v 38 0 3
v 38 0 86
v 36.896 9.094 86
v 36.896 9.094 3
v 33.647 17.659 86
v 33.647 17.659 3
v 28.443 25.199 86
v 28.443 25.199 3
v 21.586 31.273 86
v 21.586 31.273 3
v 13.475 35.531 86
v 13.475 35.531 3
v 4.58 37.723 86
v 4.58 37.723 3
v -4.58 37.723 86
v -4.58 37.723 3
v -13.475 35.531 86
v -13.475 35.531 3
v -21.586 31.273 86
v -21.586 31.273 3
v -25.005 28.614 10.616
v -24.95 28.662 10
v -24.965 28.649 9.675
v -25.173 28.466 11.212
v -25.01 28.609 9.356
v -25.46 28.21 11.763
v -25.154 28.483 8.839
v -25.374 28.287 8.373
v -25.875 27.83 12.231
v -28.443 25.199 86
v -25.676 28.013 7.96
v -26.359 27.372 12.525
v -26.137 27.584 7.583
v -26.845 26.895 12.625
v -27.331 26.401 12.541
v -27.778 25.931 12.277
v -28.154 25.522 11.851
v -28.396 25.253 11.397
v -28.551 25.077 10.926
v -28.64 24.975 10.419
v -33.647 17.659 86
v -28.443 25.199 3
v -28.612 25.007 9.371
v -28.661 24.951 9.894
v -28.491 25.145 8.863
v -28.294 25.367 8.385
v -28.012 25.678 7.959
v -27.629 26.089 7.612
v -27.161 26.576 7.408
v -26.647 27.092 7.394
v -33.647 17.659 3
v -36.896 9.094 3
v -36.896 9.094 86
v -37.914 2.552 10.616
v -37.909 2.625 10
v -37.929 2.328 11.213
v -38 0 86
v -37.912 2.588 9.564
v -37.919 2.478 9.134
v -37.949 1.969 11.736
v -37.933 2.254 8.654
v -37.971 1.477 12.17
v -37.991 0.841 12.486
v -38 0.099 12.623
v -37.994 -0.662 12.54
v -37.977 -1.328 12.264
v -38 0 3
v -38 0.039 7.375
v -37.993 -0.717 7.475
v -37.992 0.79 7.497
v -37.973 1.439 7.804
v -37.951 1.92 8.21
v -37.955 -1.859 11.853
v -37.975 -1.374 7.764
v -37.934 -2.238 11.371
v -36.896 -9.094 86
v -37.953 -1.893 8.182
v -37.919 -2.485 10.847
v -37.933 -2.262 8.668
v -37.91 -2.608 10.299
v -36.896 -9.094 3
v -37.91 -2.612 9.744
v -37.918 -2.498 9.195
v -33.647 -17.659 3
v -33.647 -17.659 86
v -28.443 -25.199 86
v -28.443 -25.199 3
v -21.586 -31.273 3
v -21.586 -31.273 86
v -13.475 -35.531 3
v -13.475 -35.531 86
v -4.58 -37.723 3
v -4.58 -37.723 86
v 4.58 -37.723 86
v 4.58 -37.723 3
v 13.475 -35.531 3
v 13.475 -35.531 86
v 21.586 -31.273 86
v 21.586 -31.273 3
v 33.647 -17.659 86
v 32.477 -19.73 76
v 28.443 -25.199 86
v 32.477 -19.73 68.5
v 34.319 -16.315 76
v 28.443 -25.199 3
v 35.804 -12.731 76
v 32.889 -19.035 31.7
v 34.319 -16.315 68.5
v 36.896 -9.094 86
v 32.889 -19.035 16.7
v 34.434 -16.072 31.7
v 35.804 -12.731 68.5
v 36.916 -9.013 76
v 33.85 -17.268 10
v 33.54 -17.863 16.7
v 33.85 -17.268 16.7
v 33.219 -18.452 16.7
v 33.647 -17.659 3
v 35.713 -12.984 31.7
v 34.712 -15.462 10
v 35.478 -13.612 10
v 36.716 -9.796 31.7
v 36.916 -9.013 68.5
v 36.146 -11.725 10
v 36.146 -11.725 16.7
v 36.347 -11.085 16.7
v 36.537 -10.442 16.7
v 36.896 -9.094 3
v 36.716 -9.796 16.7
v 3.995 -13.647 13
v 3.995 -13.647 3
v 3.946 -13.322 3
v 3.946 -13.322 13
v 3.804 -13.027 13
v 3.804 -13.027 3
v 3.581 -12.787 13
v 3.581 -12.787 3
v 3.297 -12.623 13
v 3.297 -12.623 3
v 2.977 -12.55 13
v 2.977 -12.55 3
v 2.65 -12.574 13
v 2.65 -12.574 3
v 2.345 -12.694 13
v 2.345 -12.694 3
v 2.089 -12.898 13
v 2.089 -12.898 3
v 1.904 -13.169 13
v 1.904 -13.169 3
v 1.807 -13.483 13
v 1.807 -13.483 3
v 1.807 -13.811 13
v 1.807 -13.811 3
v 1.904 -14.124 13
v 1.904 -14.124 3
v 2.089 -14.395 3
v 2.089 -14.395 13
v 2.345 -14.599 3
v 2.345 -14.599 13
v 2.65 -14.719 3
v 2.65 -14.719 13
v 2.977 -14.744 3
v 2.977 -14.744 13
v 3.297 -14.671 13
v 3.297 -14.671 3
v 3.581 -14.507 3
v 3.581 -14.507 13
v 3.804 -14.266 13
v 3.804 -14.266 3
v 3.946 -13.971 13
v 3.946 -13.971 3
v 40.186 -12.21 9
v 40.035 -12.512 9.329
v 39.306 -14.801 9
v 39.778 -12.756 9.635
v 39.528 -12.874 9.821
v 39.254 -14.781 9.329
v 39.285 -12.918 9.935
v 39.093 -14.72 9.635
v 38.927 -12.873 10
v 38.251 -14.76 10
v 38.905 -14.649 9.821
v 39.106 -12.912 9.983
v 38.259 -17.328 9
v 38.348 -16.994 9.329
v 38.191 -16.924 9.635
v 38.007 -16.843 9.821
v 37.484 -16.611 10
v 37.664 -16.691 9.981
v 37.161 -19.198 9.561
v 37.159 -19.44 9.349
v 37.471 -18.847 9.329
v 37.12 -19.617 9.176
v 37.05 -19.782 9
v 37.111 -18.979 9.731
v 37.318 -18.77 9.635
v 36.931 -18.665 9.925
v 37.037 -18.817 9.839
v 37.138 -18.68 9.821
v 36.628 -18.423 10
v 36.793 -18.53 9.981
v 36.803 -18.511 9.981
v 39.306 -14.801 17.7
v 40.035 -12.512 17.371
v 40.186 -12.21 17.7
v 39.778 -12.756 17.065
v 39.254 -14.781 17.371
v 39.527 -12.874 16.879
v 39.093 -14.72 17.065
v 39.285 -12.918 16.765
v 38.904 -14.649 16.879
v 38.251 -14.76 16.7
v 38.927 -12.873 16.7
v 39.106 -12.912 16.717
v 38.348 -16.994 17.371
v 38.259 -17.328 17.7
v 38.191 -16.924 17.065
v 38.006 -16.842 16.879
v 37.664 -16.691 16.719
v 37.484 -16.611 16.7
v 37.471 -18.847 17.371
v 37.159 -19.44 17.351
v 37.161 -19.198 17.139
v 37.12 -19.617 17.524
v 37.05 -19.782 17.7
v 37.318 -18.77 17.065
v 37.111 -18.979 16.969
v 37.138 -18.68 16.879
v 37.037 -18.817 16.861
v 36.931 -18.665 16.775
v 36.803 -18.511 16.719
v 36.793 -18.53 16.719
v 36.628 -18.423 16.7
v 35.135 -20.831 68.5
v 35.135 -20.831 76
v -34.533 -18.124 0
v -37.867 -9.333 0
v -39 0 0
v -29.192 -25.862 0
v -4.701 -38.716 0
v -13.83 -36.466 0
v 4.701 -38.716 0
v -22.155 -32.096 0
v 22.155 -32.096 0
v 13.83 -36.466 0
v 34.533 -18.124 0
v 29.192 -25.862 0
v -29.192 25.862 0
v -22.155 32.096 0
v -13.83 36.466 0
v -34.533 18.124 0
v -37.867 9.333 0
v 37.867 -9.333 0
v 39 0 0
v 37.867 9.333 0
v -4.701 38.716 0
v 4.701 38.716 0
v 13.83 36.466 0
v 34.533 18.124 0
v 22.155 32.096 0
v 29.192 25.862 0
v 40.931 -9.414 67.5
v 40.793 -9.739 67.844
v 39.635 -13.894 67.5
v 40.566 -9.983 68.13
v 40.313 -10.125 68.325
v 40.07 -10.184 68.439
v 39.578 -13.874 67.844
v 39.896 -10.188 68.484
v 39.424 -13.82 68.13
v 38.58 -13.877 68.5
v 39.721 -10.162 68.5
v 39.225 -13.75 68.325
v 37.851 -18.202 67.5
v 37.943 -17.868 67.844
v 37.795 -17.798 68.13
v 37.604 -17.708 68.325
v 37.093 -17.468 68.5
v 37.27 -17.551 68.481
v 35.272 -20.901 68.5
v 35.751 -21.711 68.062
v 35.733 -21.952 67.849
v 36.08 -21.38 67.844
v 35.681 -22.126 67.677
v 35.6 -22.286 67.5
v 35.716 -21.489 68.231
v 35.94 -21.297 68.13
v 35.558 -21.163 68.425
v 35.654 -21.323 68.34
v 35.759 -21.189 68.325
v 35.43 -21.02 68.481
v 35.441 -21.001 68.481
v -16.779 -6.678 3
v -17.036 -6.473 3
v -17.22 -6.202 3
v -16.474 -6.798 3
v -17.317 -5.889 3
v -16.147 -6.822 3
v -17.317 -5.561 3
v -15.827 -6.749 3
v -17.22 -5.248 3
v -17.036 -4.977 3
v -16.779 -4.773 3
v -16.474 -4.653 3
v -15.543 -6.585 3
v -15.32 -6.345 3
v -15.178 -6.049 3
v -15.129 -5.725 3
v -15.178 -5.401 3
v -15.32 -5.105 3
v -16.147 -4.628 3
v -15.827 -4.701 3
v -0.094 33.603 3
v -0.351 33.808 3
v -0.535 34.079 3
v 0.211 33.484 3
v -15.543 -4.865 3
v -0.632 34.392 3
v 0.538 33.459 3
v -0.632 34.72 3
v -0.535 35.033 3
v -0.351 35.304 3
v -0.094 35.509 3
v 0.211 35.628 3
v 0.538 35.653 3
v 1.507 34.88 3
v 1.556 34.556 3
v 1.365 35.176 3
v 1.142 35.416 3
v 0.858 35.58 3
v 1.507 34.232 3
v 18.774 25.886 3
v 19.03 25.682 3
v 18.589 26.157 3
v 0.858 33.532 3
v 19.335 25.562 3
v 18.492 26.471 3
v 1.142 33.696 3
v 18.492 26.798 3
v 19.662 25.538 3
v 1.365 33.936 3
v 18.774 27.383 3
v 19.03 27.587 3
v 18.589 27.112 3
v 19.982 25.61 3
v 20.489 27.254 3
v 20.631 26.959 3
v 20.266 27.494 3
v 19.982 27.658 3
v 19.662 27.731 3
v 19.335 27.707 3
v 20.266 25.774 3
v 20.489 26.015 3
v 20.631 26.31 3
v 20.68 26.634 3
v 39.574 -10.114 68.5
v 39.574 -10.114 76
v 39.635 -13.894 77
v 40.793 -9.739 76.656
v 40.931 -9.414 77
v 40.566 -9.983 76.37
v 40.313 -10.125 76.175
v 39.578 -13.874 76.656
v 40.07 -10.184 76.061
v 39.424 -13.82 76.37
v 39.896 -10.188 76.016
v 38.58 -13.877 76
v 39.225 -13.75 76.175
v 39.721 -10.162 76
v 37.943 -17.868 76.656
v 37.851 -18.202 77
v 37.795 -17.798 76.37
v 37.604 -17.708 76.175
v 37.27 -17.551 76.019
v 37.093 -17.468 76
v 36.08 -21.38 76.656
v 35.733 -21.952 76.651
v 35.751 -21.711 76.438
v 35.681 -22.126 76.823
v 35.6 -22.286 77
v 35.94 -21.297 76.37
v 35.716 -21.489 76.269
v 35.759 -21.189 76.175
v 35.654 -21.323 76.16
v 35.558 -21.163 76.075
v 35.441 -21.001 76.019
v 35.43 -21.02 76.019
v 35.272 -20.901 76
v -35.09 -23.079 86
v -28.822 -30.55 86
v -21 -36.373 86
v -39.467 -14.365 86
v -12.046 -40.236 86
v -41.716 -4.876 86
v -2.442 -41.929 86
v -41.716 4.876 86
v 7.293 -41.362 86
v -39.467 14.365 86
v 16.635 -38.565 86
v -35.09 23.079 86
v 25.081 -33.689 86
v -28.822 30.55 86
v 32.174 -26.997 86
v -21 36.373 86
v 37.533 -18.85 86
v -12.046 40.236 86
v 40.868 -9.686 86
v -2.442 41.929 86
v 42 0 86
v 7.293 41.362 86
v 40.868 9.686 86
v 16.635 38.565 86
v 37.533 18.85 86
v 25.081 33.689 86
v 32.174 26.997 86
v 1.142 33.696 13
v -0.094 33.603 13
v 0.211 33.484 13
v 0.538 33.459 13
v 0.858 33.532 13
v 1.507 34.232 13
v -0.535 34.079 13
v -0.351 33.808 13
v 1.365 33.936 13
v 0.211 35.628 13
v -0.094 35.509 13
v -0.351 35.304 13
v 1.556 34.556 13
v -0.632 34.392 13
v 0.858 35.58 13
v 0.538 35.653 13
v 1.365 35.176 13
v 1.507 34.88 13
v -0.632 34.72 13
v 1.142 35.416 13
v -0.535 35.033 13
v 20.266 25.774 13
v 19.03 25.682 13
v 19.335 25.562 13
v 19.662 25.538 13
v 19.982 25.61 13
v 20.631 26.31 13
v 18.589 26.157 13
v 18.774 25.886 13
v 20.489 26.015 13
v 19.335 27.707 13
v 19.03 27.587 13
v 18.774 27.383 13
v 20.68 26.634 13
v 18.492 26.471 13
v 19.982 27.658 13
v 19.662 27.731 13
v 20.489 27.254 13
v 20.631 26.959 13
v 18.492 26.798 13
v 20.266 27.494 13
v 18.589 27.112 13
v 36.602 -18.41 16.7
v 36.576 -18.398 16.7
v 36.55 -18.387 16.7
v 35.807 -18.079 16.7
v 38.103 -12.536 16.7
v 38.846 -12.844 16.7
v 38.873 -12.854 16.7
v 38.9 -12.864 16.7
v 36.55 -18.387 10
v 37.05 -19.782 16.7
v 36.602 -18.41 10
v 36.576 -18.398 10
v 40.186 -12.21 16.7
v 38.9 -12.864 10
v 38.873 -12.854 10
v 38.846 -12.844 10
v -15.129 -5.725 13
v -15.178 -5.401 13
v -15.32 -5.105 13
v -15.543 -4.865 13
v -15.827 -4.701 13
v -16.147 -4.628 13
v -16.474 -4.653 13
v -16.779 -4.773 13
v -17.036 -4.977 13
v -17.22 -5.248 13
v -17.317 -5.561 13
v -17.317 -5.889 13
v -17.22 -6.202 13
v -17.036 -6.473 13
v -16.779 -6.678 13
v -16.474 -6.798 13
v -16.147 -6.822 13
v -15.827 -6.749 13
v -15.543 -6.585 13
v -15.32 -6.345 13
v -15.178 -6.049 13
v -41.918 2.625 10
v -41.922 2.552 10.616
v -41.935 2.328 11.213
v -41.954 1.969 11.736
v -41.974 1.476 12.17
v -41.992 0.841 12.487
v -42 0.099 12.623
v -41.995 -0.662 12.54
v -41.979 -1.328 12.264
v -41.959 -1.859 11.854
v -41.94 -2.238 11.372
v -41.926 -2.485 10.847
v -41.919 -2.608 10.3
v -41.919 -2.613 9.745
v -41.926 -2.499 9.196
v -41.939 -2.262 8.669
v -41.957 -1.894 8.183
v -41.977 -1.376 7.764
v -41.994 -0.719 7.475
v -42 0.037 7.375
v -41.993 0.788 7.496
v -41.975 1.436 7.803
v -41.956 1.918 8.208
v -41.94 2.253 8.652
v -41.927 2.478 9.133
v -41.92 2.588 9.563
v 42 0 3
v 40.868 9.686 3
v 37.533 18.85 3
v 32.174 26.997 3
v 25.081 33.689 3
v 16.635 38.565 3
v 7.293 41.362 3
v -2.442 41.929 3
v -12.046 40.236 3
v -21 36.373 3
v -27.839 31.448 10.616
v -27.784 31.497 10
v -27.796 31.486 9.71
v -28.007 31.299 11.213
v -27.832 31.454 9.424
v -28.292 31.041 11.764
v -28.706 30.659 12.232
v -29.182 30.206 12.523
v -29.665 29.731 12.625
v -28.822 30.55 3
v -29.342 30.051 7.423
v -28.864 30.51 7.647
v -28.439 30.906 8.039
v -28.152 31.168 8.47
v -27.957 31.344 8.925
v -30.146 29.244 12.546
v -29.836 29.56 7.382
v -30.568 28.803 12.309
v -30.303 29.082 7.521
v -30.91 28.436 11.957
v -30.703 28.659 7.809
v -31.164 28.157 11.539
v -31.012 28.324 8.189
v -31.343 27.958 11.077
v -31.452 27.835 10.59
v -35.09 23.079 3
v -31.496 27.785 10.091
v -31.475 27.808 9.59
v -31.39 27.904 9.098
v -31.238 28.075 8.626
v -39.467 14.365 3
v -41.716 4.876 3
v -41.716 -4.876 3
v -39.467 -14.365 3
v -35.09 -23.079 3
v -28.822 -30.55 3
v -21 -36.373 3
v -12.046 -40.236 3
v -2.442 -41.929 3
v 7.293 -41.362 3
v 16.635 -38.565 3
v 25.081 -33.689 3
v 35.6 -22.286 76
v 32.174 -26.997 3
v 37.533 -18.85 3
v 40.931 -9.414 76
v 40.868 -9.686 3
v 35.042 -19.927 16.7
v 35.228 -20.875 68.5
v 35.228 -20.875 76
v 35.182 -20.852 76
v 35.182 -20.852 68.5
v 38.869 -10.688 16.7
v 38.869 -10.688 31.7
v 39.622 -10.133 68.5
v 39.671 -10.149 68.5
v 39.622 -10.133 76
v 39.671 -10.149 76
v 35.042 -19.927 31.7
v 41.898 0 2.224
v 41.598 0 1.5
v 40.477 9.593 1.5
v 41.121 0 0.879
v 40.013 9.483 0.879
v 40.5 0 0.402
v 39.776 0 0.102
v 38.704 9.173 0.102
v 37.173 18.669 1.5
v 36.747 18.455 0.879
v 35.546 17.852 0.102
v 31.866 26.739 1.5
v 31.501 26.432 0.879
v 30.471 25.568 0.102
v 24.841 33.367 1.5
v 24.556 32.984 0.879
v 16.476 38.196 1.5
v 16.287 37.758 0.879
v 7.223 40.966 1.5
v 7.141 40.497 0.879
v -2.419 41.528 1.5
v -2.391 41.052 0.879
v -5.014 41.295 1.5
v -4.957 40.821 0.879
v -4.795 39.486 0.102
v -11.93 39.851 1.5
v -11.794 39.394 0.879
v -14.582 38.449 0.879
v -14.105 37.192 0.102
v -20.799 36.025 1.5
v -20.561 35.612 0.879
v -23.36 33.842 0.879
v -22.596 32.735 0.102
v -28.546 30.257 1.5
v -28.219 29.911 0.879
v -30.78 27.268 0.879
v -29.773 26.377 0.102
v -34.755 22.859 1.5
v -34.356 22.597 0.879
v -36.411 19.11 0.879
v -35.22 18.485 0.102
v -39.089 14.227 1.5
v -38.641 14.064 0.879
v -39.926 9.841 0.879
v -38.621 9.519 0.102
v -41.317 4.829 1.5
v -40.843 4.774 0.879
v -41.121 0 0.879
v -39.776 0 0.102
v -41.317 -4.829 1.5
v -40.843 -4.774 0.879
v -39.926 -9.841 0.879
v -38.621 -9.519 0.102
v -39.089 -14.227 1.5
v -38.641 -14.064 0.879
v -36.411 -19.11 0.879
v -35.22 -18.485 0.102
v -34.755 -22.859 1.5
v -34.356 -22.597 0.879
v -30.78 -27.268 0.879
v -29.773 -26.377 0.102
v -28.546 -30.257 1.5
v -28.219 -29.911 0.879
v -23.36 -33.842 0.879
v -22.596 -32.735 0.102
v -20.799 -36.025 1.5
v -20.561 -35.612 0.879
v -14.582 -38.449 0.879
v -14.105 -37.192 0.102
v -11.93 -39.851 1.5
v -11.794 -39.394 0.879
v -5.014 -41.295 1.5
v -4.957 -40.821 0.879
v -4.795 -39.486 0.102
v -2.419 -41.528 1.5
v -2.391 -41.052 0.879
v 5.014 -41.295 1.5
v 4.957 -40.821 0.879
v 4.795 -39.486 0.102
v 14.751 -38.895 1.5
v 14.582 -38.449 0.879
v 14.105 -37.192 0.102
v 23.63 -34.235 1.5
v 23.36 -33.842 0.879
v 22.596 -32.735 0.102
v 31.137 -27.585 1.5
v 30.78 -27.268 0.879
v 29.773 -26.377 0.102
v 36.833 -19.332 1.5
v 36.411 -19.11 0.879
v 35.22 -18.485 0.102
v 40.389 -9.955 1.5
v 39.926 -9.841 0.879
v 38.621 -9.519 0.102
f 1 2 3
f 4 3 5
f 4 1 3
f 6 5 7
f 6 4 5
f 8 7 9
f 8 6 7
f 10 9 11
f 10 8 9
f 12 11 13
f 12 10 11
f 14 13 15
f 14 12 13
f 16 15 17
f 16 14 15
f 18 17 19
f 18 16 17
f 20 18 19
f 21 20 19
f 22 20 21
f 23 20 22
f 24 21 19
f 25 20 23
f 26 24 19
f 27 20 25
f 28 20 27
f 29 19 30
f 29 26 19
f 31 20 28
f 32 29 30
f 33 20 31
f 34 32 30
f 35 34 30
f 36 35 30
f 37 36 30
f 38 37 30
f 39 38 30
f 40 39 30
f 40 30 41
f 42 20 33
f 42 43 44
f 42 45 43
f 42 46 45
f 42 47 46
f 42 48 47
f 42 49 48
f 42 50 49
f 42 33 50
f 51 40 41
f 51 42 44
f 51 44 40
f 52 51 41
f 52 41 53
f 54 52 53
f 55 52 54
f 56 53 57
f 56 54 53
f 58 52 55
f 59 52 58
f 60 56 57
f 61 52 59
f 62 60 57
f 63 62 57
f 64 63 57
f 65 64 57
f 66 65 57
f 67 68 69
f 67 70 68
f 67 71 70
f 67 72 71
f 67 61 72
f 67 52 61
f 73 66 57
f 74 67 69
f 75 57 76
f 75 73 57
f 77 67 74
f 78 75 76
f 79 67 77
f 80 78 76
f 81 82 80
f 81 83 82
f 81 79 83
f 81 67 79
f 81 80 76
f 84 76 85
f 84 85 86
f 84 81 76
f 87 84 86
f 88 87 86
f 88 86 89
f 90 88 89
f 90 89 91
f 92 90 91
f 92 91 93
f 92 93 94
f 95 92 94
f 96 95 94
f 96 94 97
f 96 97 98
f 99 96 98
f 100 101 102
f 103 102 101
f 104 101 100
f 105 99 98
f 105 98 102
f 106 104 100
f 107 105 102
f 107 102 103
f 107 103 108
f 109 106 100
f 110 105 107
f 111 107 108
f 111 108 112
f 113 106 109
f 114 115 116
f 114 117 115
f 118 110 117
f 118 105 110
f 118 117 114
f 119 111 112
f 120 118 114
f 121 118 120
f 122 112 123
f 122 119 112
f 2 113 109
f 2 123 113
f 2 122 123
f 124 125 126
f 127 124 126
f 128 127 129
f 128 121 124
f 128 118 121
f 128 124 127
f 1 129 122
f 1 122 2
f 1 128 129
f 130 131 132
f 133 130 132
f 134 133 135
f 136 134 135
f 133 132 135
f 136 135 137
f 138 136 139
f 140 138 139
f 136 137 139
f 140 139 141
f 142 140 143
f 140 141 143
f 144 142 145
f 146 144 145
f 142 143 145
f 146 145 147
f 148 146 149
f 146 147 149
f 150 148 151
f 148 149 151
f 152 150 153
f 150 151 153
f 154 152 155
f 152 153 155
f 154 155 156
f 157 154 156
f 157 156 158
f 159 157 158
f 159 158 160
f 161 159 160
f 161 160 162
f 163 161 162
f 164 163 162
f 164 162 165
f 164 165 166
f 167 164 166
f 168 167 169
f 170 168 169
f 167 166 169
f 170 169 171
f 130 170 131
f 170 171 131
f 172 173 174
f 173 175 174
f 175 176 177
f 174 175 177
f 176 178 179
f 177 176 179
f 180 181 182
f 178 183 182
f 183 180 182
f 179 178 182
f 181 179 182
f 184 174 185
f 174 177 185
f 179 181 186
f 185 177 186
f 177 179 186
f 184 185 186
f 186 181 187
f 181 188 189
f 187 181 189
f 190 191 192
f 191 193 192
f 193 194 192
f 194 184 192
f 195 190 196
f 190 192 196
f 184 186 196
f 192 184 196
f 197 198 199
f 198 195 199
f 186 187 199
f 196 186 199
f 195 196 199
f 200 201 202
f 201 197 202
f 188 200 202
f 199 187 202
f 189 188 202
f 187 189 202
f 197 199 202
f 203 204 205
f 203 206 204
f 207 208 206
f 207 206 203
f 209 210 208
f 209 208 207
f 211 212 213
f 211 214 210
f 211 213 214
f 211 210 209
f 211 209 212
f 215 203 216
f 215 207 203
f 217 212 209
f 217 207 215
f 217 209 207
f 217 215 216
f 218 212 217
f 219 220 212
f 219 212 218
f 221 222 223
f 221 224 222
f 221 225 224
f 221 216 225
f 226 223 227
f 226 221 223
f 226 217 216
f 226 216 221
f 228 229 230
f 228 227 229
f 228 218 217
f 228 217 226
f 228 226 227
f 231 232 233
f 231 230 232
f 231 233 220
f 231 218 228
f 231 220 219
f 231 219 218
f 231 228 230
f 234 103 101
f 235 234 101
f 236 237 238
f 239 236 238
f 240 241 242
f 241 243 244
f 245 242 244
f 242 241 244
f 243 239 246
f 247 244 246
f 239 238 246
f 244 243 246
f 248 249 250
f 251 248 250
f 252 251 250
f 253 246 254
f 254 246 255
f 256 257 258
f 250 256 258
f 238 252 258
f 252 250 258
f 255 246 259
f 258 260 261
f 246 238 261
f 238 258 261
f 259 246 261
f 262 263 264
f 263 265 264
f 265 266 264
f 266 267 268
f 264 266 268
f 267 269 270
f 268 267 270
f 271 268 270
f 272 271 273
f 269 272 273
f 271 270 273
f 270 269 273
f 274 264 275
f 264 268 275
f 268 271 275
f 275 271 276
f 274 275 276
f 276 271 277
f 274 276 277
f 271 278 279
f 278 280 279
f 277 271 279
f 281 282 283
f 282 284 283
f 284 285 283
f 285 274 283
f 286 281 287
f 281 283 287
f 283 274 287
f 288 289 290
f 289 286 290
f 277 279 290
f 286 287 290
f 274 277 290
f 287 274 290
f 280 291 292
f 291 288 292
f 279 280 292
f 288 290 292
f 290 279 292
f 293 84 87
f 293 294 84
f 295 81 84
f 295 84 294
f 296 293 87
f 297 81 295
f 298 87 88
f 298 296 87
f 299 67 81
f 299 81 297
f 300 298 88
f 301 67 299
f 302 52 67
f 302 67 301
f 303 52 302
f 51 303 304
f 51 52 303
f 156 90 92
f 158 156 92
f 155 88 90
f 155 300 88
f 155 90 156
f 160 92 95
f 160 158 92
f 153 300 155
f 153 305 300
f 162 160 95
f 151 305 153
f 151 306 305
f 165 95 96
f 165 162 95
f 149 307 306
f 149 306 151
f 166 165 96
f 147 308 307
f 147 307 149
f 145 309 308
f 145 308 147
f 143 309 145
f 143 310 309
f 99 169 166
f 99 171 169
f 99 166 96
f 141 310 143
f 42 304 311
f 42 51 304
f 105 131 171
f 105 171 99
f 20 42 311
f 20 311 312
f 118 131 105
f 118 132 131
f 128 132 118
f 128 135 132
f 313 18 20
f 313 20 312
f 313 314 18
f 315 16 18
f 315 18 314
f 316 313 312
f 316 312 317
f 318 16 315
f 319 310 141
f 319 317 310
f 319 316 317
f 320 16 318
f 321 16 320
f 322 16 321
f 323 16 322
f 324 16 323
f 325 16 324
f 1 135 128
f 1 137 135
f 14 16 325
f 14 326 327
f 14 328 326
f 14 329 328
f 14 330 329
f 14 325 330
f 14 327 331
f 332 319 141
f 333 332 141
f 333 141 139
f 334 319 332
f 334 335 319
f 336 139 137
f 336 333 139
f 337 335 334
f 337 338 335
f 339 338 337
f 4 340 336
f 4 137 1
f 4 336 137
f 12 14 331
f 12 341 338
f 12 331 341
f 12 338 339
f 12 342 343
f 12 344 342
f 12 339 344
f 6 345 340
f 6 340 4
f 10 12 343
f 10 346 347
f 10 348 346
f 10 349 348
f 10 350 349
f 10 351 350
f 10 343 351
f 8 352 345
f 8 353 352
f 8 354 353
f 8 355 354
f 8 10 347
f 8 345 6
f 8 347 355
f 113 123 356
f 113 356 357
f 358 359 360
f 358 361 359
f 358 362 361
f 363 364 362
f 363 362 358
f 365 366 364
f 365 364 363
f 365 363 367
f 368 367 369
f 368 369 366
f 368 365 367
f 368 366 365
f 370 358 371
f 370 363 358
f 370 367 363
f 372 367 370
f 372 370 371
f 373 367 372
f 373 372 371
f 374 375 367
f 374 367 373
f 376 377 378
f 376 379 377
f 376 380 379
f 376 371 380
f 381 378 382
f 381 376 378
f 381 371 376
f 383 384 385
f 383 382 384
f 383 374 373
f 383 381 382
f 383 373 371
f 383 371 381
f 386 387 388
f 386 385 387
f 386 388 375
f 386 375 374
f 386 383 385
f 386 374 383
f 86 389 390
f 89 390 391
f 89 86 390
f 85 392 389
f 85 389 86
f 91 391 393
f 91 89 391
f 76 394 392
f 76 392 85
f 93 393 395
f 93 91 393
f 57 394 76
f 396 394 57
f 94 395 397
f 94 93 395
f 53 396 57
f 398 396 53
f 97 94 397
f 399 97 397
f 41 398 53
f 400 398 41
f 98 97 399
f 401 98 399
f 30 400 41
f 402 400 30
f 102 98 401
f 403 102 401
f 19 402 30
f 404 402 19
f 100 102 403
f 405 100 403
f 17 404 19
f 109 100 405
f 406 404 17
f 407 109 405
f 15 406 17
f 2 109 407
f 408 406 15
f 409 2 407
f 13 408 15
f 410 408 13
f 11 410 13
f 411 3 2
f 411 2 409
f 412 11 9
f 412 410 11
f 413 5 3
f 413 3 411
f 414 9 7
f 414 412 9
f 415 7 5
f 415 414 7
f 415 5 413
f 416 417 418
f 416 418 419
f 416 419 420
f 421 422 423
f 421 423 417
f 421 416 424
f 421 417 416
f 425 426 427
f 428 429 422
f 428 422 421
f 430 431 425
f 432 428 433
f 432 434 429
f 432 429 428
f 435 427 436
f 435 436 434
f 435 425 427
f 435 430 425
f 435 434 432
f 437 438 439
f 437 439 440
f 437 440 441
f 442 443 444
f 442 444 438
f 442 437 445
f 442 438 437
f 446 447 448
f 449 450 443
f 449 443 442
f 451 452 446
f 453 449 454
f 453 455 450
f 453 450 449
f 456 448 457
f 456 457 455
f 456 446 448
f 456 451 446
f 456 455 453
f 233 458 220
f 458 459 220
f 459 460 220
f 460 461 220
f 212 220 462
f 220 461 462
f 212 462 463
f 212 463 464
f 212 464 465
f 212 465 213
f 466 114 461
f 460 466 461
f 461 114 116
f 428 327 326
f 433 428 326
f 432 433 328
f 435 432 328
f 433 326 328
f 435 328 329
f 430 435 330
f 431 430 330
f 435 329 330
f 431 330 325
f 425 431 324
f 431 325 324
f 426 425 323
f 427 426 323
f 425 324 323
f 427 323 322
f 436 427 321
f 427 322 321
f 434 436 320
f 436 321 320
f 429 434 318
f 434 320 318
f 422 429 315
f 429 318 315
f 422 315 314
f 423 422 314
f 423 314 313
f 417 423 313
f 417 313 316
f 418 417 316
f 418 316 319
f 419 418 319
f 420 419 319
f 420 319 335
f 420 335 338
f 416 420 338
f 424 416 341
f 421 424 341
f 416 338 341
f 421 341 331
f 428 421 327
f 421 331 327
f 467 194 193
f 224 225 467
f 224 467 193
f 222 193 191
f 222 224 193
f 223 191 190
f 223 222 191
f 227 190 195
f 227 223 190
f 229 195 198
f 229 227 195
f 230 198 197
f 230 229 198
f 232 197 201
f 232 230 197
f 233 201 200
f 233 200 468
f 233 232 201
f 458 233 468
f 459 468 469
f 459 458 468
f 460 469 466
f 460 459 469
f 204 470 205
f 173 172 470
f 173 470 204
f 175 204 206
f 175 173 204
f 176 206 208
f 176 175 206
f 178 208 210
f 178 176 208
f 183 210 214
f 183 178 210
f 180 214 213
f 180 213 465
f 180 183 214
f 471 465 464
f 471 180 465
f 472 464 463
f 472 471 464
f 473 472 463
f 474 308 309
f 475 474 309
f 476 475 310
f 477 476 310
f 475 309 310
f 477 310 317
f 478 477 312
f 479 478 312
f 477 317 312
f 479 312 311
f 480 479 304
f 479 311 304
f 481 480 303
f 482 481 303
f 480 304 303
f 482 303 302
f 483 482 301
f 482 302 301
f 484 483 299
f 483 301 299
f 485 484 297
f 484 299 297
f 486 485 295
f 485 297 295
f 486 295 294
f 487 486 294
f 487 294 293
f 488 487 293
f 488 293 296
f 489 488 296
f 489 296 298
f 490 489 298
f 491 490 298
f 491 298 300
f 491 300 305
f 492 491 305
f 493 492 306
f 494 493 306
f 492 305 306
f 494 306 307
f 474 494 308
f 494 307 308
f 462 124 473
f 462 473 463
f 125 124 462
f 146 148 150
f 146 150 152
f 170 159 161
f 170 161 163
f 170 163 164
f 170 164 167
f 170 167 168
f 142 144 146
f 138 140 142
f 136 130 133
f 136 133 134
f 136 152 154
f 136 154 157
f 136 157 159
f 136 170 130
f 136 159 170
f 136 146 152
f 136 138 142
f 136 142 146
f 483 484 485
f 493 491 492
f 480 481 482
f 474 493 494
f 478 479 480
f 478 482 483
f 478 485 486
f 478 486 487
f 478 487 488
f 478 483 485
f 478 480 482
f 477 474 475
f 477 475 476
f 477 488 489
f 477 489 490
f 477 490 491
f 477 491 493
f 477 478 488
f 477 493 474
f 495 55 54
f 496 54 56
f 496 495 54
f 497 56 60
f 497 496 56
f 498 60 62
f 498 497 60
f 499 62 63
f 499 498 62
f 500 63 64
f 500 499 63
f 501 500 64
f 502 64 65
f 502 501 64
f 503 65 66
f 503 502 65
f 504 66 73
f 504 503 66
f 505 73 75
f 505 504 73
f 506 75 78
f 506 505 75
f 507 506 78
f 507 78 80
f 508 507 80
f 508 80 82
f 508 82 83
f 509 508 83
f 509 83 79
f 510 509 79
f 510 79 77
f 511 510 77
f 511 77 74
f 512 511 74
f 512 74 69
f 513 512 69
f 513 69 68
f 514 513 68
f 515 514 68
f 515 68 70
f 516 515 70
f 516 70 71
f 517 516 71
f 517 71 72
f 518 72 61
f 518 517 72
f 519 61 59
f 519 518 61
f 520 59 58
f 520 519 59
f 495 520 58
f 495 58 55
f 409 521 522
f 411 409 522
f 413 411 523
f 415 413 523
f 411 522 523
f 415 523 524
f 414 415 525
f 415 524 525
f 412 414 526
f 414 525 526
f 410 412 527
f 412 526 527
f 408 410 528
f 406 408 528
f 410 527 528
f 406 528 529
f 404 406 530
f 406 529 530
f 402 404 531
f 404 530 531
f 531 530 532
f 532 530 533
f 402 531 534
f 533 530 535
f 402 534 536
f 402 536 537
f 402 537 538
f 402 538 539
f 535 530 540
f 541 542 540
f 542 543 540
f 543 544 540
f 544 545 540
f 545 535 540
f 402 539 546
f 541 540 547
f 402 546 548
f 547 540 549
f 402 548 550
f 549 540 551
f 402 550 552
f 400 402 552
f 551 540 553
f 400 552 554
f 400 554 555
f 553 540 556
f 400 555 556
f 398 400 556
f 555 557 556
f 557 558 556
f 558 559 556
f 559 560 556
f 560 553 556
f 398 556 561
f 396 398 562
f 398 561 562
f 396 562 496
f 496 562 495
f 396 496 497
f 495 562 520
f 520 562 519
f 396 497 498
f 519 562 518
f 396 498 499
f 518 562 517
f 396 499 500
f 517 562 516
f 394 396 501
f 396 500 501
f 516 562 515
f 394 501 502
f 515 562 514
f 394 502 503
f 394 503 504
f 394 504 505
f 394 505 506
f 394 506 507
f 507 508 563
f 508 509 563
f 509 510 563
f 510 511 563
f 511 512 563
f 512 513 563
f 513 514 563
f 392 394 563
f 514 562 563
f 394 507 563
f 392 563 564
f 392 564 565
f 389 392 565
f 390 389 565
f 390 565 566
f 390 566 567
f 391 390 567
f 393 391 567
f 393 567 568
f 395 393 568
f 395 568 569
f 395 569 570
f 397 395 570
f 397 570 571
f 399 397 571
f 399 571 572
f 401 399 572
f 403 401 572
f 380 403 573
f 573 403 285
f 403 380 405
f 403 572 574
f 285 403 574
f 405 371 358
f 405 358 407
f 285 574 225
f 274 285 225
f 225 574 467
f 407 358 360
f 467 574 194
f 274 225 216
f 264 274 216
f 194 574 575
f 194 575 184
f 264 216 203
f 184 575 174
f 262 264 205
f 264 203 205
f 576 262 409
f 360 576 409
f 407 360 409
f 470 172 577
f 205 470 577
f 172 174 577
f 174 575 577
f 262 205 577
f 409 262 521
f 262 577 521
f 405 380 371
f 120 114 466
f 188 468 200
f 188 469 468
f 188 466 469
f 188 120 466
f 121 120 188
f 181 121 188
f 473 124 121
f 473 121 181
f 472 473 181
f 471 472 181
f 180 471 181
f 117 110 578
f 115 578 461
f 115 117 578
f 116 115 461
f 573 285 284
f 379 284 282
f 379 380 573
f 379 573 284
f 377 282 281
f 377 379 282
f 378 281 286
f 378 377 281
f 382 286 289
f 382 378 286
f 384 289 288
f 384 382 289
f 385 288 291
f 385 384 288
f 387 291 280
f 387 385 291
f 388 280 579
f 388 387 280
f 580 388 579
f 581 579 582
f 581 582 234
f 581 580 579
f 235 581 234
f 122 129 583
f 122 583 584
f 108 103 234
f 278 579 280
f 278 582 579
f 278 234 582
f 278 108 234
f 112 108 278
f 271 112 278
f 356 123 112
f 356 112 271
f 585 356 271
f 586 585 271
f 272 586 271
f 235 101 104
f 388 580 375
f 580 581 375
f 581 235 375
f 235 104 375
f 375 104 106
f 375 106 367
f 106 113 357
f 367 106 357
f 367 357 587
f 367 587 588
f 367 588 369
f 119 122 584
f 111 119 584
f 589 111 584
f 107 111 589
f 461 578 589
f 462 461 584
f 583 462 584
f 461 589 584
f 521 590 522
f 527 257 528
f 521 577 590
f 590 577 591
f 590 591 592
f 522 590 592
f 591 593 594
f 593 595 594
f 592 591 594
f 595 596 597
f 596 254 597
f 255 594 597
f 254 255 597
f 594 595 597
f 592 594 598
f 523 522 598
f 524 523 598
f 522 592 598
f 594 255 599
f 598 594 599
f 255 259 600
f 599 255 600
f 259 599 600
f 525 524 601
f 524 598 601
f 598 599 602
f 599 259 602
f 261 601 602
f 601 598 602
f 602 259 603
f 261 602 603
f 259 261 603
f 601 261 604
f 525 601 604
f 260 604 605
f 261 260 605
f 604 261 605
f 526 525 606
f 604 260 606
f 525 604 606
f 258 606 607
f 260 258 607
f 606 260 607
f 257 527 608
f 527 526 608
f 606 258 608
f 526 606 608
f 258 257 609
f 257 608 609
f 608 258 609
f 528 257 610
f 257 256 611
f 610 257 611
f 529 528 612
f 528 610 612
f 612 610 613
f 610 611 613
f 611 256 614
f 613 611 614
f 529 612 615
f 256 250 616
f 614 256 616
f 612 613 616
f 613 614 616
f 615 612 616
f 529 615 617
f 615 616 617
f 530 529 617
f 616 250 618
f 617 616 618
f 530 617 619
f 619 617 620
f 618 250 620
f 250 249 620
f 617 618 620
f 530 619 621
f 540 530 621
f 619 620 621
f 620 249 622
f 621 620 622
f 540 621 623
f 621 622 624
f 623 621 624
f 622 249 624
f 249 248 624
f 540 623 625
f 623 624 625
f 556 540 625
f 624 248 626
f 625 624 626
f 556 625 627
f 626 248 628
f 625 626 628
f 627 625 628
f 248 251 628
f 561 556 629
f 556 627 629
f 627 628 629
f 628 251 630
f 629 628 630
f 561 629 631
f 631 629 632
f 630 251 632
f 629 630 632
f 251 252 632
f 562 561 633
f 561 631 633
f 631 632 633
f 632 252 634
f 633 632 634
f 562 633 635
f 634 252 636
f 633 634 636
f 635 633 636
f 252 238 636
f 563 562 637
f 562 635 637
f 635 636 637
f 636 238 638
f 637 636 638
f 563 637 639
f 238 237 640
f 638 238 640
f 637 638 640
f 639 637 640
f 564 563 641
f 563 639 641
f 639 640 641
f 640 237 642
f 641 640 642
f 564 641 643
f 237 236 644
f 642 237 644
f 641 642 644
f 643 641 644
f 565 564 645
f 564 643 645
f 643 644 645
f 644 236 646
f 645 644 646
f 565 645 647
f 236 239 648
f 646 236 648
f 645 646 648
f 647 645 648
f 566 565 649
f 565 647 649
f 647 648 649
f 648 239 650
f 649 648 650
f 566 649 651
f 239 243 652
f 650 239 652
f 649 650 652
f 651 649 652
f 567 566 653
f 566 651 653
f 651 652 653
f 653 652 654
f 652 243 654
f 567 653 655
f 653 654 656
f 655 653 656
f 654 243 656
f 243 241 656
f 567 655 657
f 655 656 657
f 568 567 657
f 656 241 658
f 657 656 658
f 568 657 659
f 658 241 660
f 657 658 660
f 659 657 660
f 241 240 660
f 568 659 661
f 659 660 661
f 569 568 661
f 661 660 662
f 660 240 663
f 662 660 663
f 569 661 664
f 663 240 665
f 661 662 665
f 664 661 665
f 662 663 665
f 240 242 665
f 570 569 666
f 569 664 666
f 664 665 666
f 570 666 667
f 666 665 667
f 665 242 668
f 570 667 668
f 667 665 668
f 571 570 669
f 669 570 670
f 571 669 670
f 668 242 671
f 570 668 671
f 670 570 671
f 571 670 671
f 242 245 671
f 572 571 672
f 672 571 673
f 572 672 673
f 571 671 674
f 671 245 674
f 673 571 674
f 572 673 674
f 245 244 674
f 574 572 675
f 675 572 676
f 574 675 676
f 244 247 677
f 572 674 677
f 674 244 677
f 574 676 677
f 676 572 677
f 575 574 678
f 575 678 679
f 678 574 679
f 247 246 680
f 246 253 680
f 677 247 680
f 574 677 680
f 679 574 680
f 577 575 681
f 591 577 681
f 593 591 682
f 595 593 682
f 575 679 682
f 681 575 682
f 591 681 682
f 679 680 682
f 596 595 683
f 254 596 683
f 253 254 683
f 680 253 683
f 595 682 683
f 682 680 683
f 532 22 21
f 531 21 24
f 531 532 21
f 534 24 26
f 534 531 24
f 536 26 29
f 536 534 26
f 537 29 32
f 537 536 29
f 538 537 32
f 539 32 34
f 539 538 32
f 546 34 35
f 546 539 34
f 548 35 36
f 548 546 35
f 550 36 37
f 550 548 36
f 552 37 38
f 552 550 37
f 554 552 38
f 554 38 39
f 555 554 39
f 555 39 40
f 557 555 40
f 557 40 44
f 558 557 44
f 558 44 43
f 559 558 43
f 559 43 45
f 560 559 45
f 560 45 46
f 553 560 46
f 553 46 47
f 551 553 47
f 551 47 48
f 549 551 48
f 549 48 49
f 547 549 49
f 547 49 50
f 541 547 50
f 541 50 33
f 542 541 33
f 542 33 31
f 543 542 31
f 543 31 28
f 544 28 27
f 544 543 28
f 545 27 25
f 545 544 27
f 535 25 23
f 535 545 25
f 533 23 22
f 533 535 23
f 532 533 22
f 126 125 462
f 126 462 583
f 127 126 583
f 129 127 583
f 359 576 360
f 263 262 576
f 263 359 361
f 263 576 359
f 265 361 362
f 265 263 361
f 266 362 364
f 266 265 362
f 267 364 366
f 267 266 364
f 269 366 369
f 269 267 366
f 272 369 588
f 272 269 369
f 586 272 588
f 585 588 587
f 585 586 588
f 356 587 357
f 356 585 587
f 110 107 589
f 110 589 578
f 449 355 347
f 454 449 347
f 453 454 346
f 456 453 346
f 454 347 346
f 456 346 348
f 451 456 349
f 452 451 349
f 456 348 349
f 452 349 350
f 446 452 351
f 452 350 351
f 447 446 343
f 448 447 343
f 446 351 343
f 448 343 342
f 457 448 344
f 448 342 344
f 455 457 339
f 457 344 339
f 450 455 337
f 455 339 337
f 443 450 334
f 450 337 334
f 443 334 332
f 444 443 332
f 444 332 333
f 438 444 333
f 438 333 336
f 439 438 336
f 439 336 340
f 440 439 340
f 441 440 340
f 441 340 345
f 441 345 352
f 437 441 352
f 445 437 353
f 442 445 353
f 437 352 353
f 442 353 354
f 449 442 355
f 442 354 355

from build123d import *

# Parameters (mm, degrees)
F0_R           = 42
F0_R_2         = 38
F1_DEPTH       = 86
F2_DEPTH       = 3
F7_R           = 2.625
F8_DEPTH       = 4.0917746397
F9_R           = 2.625
F10_DEPTH      = 4.0917746397
F11_R          = 3
F14_W          = 11.6
F14_H          = 7.5
F14_W_2        = 6
F14_H_2        = 6.7
F15_DEPTH      = 54.8766446555
F16_R          = 1.1
F17_DEPTH      = 10
F18_T1_DEPTH   = 7.5
F18_T3_DEPTH   = 6.7
F18_T8_ANGLE   = 22.6962930478
F18_T14_ANGLE  = 22.6962930478
F18_T20_ANGLE  = 15.0130363442
F18_T26_ANGLE  = 15.0130363442
F18_T33_DEPTH  = 10.4488940484
F18_T37_ANGLE  = 22.6962930478
F18_T44_ANGLE  = 22.6962930478
F18_T48_DEPTH  = 10.4488940484
F18_T55_DEPTH  = 10.4488940484
F18_T59_ANGLE  = 22.6962930478
F18_T66_DEPTH  = 10.4488940484
F18_T70_ANGLE  = 22.6962930478
F18_T77_ANGLE  = 15.0130363442
F18_T81_DEPTH  = 9.4537517655
F18_T88_ANGLE  = 15.0130363442
F18_T92_DEPTH  = 9.4537517655
F18_T99_ANGLE  = 15.0130363442
F18_T103_DEPTH = 9.4537517655
F18_T110_DEPTH = 9.4537517655
F18_T114_ANGLE = 15.0130363442
F19_DEPTH      = 40


# Not quite as in the source:
# - a fillet or chamfer that OpenCascade refuses, or shapes differently, is made with other operations: its cross-section is extruded or revolved along the edge and cut away or added


with BuildPart() as f1:
    # F0 (on Top) → F1 (new body)
    with BuildSketch(Plane.XY):
        Circle(F0_R)
        Circle(F0_R_2, mode=Mode.SUBTRACT)
    extrude(amount=F1_DEPTH)

    # F0 (on Top) → F2 (join)
    with BuildSketch(Plane.XY):
        Circle(F0_R)
        Circle(F0_R_2, mode=Mode.SUBTRACT)
        Circle(F0_R_2)
    extrude(amount=F2_DEPTH)

    # F7 (on plane+point) → F8 (cut, through all)
    with BuildSketch(Plane.YZ.offset(-42)):
        with Locations((0, 10)):
            Circle(F7_R)
    extrude(amount=F8_DEPTH, mode=Mode.SUBTRACT)

    # F9 (on face) → F10 (cut, through all)
    with BuildSketch(Plane(origin=(-29.6984848098, 29.6984848098, 0), x_dir=(0.7071067812, 0.7071067812, 0), z_dir=(0.7071067812, -0.7071067812, 0))):
        with Locations((0, 10)):
            Circle(F9_R)
    extrude(amount=F10_DEPTH, mode=Mode.SUBTRACT)

    # F11
    f11_edges = [f1.edges().sort_by_distance(p)[0] for p in [
        (-42, 0, 0),
    ]]
    fillet(f11_edges, radius=F11_R)

    # F14 (on face) → F15 (cut, through all)
    with BuildSketch(Plane(origin=(0, 0, 0), x_dir=(0.3826834324, 0.9238795325, 0), z_dir=(0.9238795325, -0.3826834324, 0))):
        with Locations((0, 72.25)):
            Rectangle(F14_W, F14_H)
        with Locations((0, 13.35)):
            Rectangle(F14_W_2, F14_H_2)
    extrude(amount=F15_DEPTH, mode=Mode.SUBTRACT)

    # F16 (on face) → F17 (join)
    with BuildSketch(Plane.XY.offset(3)):
        with Locations((19.5800699423, 26.6344591071)):
            Circle(F16_R)
        with Locations((2.8950722912, -13.6466885104)):
            Circle(F16_R)
        with Locations((-16.2292340318, -5.7251414605)):
            Circle(F16_R)
        with Locations((0.4557636193, 34.556006157)):
            Circle(F16_R)
    extrude(amount=F17_DEPTH)

    # F18: fillet of radius 1 on 8 edges, made by hand

    # F18_s2 → F18_t1 (cut)
    with BuildSketch(Plane.XY.offset(68.5)):
        with BuildLine():
            ThreePointArc((35.5998174413, -22.2857128706), (35.7047230458, -21.4506255904), (35.1348861726, -20.8312211268))
            Line((35.1348861726, -20.8312211268), (36.2116037163, -21.2772121363))
            ThreePointArc((36.2116037163, -21.2772121363), (35.9092511841, -21.783610339), (35.5998174413, -22.2857128706))
        make_face()
        with BuildLine():
            ThreePointArc((40.9312510161, -9.4144936274), (40.4149346017, -10.0791689704), (39.5740139881, -10.1142185497))
            Line((39.5740139881, -10.1142185497), (40.6507315318, -10.5602095591))
            ThreePointArc((40.6507315318, -10.5602095591), (40.795013609, -9.9883364302), (40.9312510161, -9.4144936274))
        make_face()
    extrude(amount=F18_T1_DEPTH, mode=Mode.SUBTRACT)

    # F18_s4 → F18_t3 (cut)
    with BuildSketch(Plane.XY.offset(10)):
        with BuildLine():
            ThreePointArc((40.1859015546, -12.2103773999), (39.6564422799, -12.8237413852), (38.8464109423, -12.843533661))
            Line((38.8464109423, -12.843533661), (39.8518769876, -13.2600113334))
            ThreePointArc((39.8518769876, -13.2600113334), (40.0223304087, -12.7362894384), (40.1859015546, -12.2103773999))
        make_face()
        with BuildLine():
            ThreePointArc((37.0497641576, -19.781682837), (37.1090937475, -18.9735847602), (36.5503103481, -18.386810856))
            Line((36.5503103481, -18.386810856), (37.5557763934, -18.8032885285))
            ThreePointArc((37.5557763934, -18.8032885285), (37.3059778599, -19.2941446018), (37.0497641576, -19.781682837))
        make_face()
    extrude(amount=F18_T3_DEPTH, mode=Mode.SUBTRACT)


with BuildPart() as f18_tool6:
    # F18_s7 → F18_t8 (revolve)
    with BuildSketch(Plane(origin=(0, 0, 0), x_dir=(0, 0, 1), z_dir=(0.193409971, 0.9811180271, 0))):
        with BuildLine():
            ThreePointArc((67.5, 42), (68.2071067812, 41.7071067812), (68.5, 41))
            Line((68.5, 41), (68.5, 42))
            Line((68.5, 42), (67.5, 42))
        make_face()
    revolve(axis=Axis((0, 0, 68.5), (0, 0, -1)), revolution_arc=F18_T8_ANGLE)

    split(bisect_by=Plane(origin=(2.2195639077, 5.3585012886, 0), x_dir=(0, 0, 1), z_dir=(-0.3826834324, -0.9238795325, 0)), keep=Keep.TOP)

    split(bisect_by=Plane(origin=(-2.2195639077, -5.3585012886, 0), x_dir=(0, 0, 1), z_dir=(0.3826834324, 0.9238795325, 0)), keep=Keep.TOP)


with BuildPart() as f1_1:
    add(f1.part)

    # F18_t5: cut F18_tool6
    add(f18_tool6.part, mode=Mode.SUBTRACT)


with BuildPart() as f18_tool12:
    # F18_s13 → F18_t14 (revolve)
    with BuildSketch(Plane(origin=(0, 0, 0), x_dir=(0, 0, 1), z_dir=(0.193409971, 0.9811180271, 0))):
        with BuildLine():
            ThreePointArc((77, 42), (76.2928932188, 41.7071067812), (76, 41))
            Line((76, 41), (76, 42))
            Line((76, 42), (77, 42))
        make_face()
    revolve(axis=Axis((0, 0, 76), (0, 0, -1)), revolution_arc=F18_T14_ANGLE)

    split(bisect_by=Plane(origin=(2.2195639077, 5.3585012886, 0), x_dir=(0, 0, 1), z_dir=(-0.3826834324, -0.9238795325, 0)), keep=Keep.TOP)

    split(bisect_by=Plane(origin=(-2.2195639077, -5.3585012886, 0), x_dir=(0, 0, 1), z_dir=(0.3826834324, 0.9238795325, 0)), keep=Keep.TOP)


with BuildPart() as f1_2:
    add(f1_1.part)

    # F18_t11: cut F18_tool12
    add(f18_tool12.part, mode=Mode.SUBTRACT)


with BuildPart() as f18_tool18:
    # F18_s19 → F18_t20 (revolve)
    with BuildSketch(Plane(origin=(0, 0, 0), x_dir=(0, 0, 1), z_dir=(0.2587091563, 0.9659552642, 0))):
        with BuildLine():
            ThreePointArc((9, 42), (9.7071067812, 41.7071067812), (10, 41))
            Line((10, 41), (10, 42))
            Line((10, 42), (9, 42))
        make_face()
    revolve(axis=Axis((0, 0, 10), (0, 0, -1)), revolution_arc=F18_T20_ANGLE)

    split(bisect_by=Plane(origin=(1.1480502971, 2.7716385975, 0), x_dir=(0, 0, 1), z_dir=(-0.3826834324, -0.9238795325, 0)), keep=Keep.TOP)

    split(bisect_by=Plane(origin=(-1.1480502971, -2.7716385975, 0), x_dir=(0, 0, 1), z_dir=(0.3826834324, 0.9238795325, 0)), keep=Keep.TOP)


with BuildPart() as f1_3:
    add(f1_2.part)

    # F18_t17: cut F18_tool18
    add(f18_tool18.part, mode=Mode.SUBTRACT)


with BuildPart() as f18_tool24:
    # F18_s25 → F18_t26 (revolve)
    with BuildSketch(Plane(origin=(0, 0, 0), x_dir=(0, 0, 1), z_dir=(0.2587091563, 0.9659552642, 0))):
        with BuildLine():
            ThreePointArc((17.7, 42), (16.9928932188, 41.7071067812), (16.7, 41))
            Line((16.7, 41), (16.7, 42))
            Line((16.7, 42), (17.7, 42))
        make_face()
    revolve(axis=Axis((0, 0, 16.7), (0, 0, -1)), revolution_arc=F18_T26_ANGLE)

    split(bisect_by=Plane(origin=(-1.1480502971, -2.7716385975, 0), x_dir=(0, 0, 1), z_dir=(0.3826834324, 0.9238795325, 0)), keep=Keep.TOP)

    split(bisect_by=Plane(origin=(1.1480502971, 2.7716385975, 0), x_dir=(0, 0, 1), z_dir=(-0.3826834324, -0.9238795325, 0)), keep=Keep.TOP)


with BuildPart() as f1_4:
    add(f1_3.part)

    # F18_t23: cut F18_tool24
    add(f18_tool24.part, mode=Mode.SUBTRACT)


with BuildPart() as f18_tool31:
    # F18_s32 → F18_t33 (new body)
    with BuildSketch(Plane.XY.offset(76)):
        with BuildLine():
            ThreePointArc((40.9312510161, -9.4144936274), (40.4149346017, -10.0791689704), (39.5740139881, -10.1142185497))
            Line((39.5740139881, -10.1142185497), (40.6507315318, -10.5602095591))
            ThreePointArc((40.6507315318, -10.5602095591), (40.795013609, -9.9883364302), (40.9312510161, -9.4144936274))
        make_face()
    extrude(amount=-F18_T33_DEPTH)

    split(bisect_by=Plane.XY.offset(68.5), keep=Keep.BOTTOM)


with BuildPart() as f18_tool35:
    # F18_s36 → F18_t37 (revolve)
    with BuildSketch(Plane(origin=(0, 0, 0), x_dir=(0, 0, 1), z_dir=(0.193409971, 0.9811180271, 0))):
        with BuildLine():
            ThreePointArc((67.5, 42), (68.2071067812, 41.7071067812), (68.5, 41))
            Line((68.5, 41), (68.5, 42))
            Line((68.5, 42), (67.5, 42))
        make_face()
    revolve(axis=Axis((0, 0, 68.5), (0, 0, -1)), revolution_arc=F18_T37_ANGLE)

    split(bisect_by=Plane(origin=(2.2195639077, 5.3585012886, 0), x_dir=(0, 0, 1), z_dir=(0.3826834324, 0.9238795325, 0)), keep=Keep.TOP)


with BuildPart() as f18_tool31_1:
    add(f18_tool31.part)

    # F18_t39: intersect F18_tool35
    add(f18_tool35.part, mode=Mode.INTERSECT)


with BuildPart() as f1_5:
    add(f1_4.part)

    # F18_t29: cut F18_tool31
    add(f18_tool31_1.part, mode=Mode.SUBTRACT)


with BuildPart() as f18_tool42:
    # F18_s43 → F18_t44 (revolve)
    with BuildSketch(Plane(origin=(0, 0, 0), x_dir=(0, 0, 1), z_dir=(0.193409971, 0.9811180271, 0))):
        with BuildLine():
            ThreePointArc((67.5, 42), (68.2071067812, 41.7071067812), (68.5, 41))
            Line((68.5, 41), (68.5, 42))
            Line((68.5, 42), (67.5, 42))
        make_face()
    revolve(axis=Axis((0, 0, 68.5), (0, 0, -1)), revolution_arc=F18_T44_ANGLE)

    split(bisect_by=Plane(origin=(-2.2195639077, -5.3585012886, 0), x_dir=(0, 0, 1), z_dir=(-0.3826834324, -0.9238795325, 0)), keep=Keep.TOP)


with BuildPart() as f18_tool46:
    # F18_s47 → F18_t48 (new body)
    with BuildSketch(Plane.XY.offset(76)):
        with BuildLine():
            ThreePointArc((35.5998174413, -22.2857128706), (35.7047230458, -21.4506255904), (35.1348861726, -20.8312211268))
            Line((35.1348861726, -20.8312211268), (36.2116037163, -21.2772121363))
            ThreePointArc((36.2116037163, -21.2772121363), (35.9092511841, -21.783610339), (35.5998174413, -22.2857128706))
        make_face()
    extrude(amount=-F18_T48_DEPTH)

    split(bisect_by=Plane.XY.offset(68.5), keep=Keep.BOTTOM)


with BuildPart() as f18_tool42_1:
    add(f18_tool42.part)

    # F18_t50: intersect F18_tool46
    add(f18_tool46.part, mode=Mode.INTERSECT)


with BuildPart() as f1_6:
    add(f1_5.part)

    # F18_t40: cut F18_tool42
    add(f18_tool42_1.part, mode=Mode.SUBTRACT)


with BuildPart() as f18_tool53:
    # F18_s54 → F18_t55 (new body)
    with BuildSketch(Plane.XY.offset(78.9488940484)):
        with BuildLine():
            ThreePointArc((35.5998174413, -22.2857128706), (35.7047230458, -21.4506255904), (35.1348861726, -20.8312211268))
            Line((35.1348861726, -20.8312211268), (36.2116037163, -21.2772121363))
            ThreePointArc((36.2116037163, -21.2772121363), (35.9092511841, -21.783610339), (35.5998174413, -22.2857128706))
        make_face()
    extrude(amount=-F18_T55_DEPTH)

    split(bisect_by=Plane.XY.offset(76), keep=Keep.TOP)


with BuildPart() as f18_tool57:
    # F18_s58 → F18_t59 (revolve)
    with BuildSketch(Plane(origin=(0, 0, 0), x_dir=(0, 0, 1), z_dir=(0.193409971, 0.9811180271, 0))):
        with BuildLine():
            ThreePointArc((77, 42), (76.2928932188, 41.7071067812), (76, 41))
            Line((76, 41), (76, 42))
            Line((76, 42), (77, 42))
        make_face()
    revolve(axis=Axis((0, 0, 76), (0, 0, -1)), revolution_arc=F18_T59_ANGLE)

    split(bisect_by=Plane(origin=(-2.2195639077, -5.3585012886, 0), x_dir=(0, 0, 1), z_dir=(-0.3826834324, -0.9238795325, 0)), keep=Keep.TOP)


with BuildPart() as f18_tool53_1:
    add(f18_tool53.part)

    # F18_t61: intersect F18_tool57
    add(f18_tool57.part, mode=Mode.INTERSECT)


with BuildPart() as f1_7:
    add(f1_6.part)

    # F18_t51: cut F18_tool53
    add(f18_tool53_1.part, mode=Mode.SUBTRACT)


with BuildPart() as f18_tool64:
    # F18_s65 → F18_t66 (new body)
    with BuildSketch(Plane.XY.offset(78.9488940484)):
        with BuildLine():
            ThreePointArc((40.9312510161, -9.4144936274), (40.4149346017, -10.0791689704), (39.5740139881, -10.1142185497))
            Line((39.5740139881, -10.1142185497), (40.6507315318, -10.5602095591))
            ThreePointArc((40.6507315318, -10.5602095591), (40.795013609, -9.9883364302), (40.9312510161, -9.4144936274))
        make_face()
    extrude(amount=-F18_T66_DEPTH)

    split(bisect_by=Plane.XY.offset(76), keep=Keep.TOP)


with BuildPart() as f18_tool68:
    # F18_s69 → F18_t70 (revolve)
    with BuildSketch(Plane(origin=(0, 0, 0), x_dir=(0, 0, 1), z_dir=(0.193409971, 0.9811180271, 0))):
        with BuildLine():
            ThreePointArc((77, 42), (76.2928932188, 41.7071067812), (76, 41))
            Line((76, 41), (76, 42))
            Line((76, 42), (77, 42))
        make_face()
    revolve(axis=Axis((0, 0, 76), (0, 0, -1)), revolution_arc=F18_T70_ANGLE)

    split(bisect_by=Plane(origin=(2.2195639077, 5.3585012886, 0), x_dir=(0, 0, 1), z_dir=(0.3826834324, 0.9238795325, 0)), keep=Keep.TOP)


with BuildPart() as f18_tool64_1:
    add(f18_tool64.part)

    # F18_t72: intersect F18_tool68
    add(f18_tool68.part, mode=Mode.INTERSECT)


with BuildPart() as f1_8:
    add(f1_7.part)

    # F18_t62: cut F18_tool64
    add(f18_tool64_1.part, mode=Mode.SUBTRACT)


with BuildPart() as f18_tool75:
    # F18_s76 → F18_t77 (revolve)
    with BuildSketch(Plane(origin=(0, 0, 0), x_dir=(0, 0, 1), z_dir=(0.2587091563, 0.9659552642, 0))):
        with BuildLine():
            ThreePointArc((9, 42), (9.7071067812, 41.7071067812), (10, 41))
            Line((10, 41), (10, 42))
            Line((10, 42), (9, 42))
        make_face()
    revolve(axis=Axis((0, 0, 10), (0, 0, -1)), revolution_arc=F18_T77_ANGLE)

    split(bisect_by=Plane(origin=(1.1480502971, 2.7716385975, 0), x_dir=(0, 0, 1), z_dir=(0.3826834324, 0.9238795325, 0)), keep=Keep.TOP)


with BuildPart() as f18_tool79:
    # F18_s80 → F18_t81 (new body)
    with BuildSketch(Plane.XY.offset(16.7)):
        with BuildLine():
            ThreePointArc((40.1859015546, -12.2103773999), (39.6564422799, -12.8237413852), (38.8464109423, -12.843533661))
            Line((38.8464109423, -12.843533661), (39.8518769876, -13.2600113334))
            ThreePointArc((39.8518769876, -13.2600113334), (40.0223304087, -12.7362894384), (40.1859015546, -12.2103773999))
        make_face()
    extrude(amount=-F18_T81_DEPTH)

    split(bisect_by=Plane.XY.offset(10), keep=Keep.BOTTOM)


with BuildPart() as f18_tool75_1:
    add(f18_tool75.part)

    # F18_t83: intersect F18_tool79
    add(f18_tool79.part, mode=Mode.INTERSECT)


with BuildPart() as f1_9:
    add(f1_8.part)

    # F18_t73: cut F18_tool75
    add(f18_tool75_1.part, mode=Mode.SUBTRACT)


with BuildPart() as f18_tool86:
    # F18_s87 → F18_t88 (revolve)
    with BuildSketch(Plane(origin=(0, 0, 0), x_dir=(0, 0, 1), z_dir=(0.2587091563, 0.9659552642, 0))):
        with BuildLine():
            ThreePointArc((9, 42), (9.7071067812, 41.7071067812), (10, 41))
            Line((10, 41), (10, 42))
            Line((10, 42), (9, 42))
        make_face()
    revolve(axis=Axis((0, 0, 10), (0, 0, -1)), revolution_arc=F18_T88_ANGLE)

    split(bisect_by=Plane(origin=(-1.1480502971, -2.7716385975, 0), x_dir=(0, 0, 1), z_dir=(-0.3826834324, -0.9238795325, 0)), keep=Keep.TOP)


with BuildPart() as f18_tool90:
    # F18_s91 → F18_t92 (new body)
    with BuildSketch(Plane.XY.offset(16.7)):
        with BuildLine():
            ThreePointArc((37.0497641576, -19.781682837), (37.1090937475, -18.9735847602), (36.5503103481, -18.386810856))
            Line((36.5503103481, -18.386810856), (37.5557763934, -18.8032885285))
            ThreePointArc((37.5557763934, -18.8032885285), (37.3059778599, -19.2941446018), (37.0497641576, -19.781682837))
        make_face()
    extrude(amount=-F18_T92_DEPTH)

    split(bisect_by=Plane.XY.offset(10), keep=Keep.BOTTOM)


with BuildPart() as f18_tool86_1:
    add(f18_tool86.part)

    # F18_t94: intersect F18_tool90
    add(f18_tool90.part, mode=Mode.INTERSECT)


with BuildPart() as f1_10:
    add(f1_9.part)

    # F18_t84: cut F18_tool86
    add(f18_tool86_1.part, mode=Mode.SUBTRACT)


with BuildPart() as f18_tool97:
    # F18_s98 → F18_t99 (revolve)
    with BuildSketch(Plane(origin=(0, 0, 0), x_dir=(0, 0, 1), z_dir=(0.2587091563, 0.9659552642, 0))):
        with BuildLine():
            ThreePointArc((17.7, 42), (16.9928932188, 41.7071067812), (16.7, 41))
            Line((16.7, 41), (16.7, 42))
            Line((16.7, 42), (17.7, 42))
        make_face()
    revolve(axis=Axis((0, 0, 16.7), (0, 0, -1)), revolution_arc=F18_T99_ANGLE)

    split(bisect_by=Plane(origin=(1.1480502971, 2.7716385975, 0), x_dir=(0, 0, 1), z_dir=(0.3826834324, 0.9238795325, 0)), keep=Keep.TOP)


with BuildPart() as f18_tool101:
    # F18_s102 → F18_t103 (new body)
    with BuildSketch(Plane.XY.offset(19.4537517655)):
        with BuildLine():
            ThreePointArc((40.1859015546, -12.2103773999), (39.6564422799, -12.8237413852), (38.8464109423, -12.843533661))
            Line((38.8464109423, -12.843533661), (39.8518769876, -13.2600113334))
            ThreePointArc((39.8518769876, -13.2600113334), (40.0223304087, -12.7362894384), (40.1859015546, -12.2103773999))
        make_face()
    extrude(amount=-F18_T103_DEPTH)

    split(bisect_by=Plane.XY.offset(16.7), keep=Keep.TOP)


with BuildPart() as f18_tool97_1:
    add(f18_tool97.part)

    # F18_t105: intersect F18_tool101
    add(f18_tool101.part, mode=Mode.INTERSECT)


with BuildPart() as f1_11:
    add(f1_10.part)

    # F18_t95: cut F18_tool97
    add(f18_tool97_1.part, mode=Mode.SUBTRACT)


with BuildPart() as f18_tool108:
    # F18_s109 → F18_t110 (new body)
    with BuildSketch(Plane.XY.offset(19.4537517655)):
        with BuildLine():
            ThreePointArc((37.0497641576, -19.781682837), (37.1090937475, -18.9735847602), (36.5503103481, -18.386810856))
            Line((36.5503103481, -18.386810856), (37.5557763934, -18.8032885285))
            ThreePointArc((37.5557763934, -18.8032885285), (37.3059778599, -19.2941446018), (37.0497641576, -19.781682837))
        make_face()
    extrude(amount=-F18_T110_DEPTH)

    split(bisect_by=Plane.XY.offset(16.7), keep=Keep.TOP)


with BuildPart() as f18_tool112:
    # F18_s113 → F18_t114 (revolve)
    with BuildSketch(Plane(origin=(0, 0, 0), x_dir=(0, 0, 1), z_dir=(0.2587091563, 0.9659552642, 0))):
        with BuildLine():
            ThreePointArc((17.7, 42), (16.9928932188, 41.7071067812), (16.7, 41))
            Line((16.7, 41), (16.7, 42))
            Line((16.7, 42), (17.7, 42))
        make_face()
    revolve(axis=Axis((0, 0, 16.7), (0, 0, -1)), revolution_arc=F18_T114_ANGLE)

    split(bisect_by=Plane(origin=(-1.1480502971, -2.7716385975, 0), x_dir=(0, 0, 1), z_dir=(-0.3826834324, -0.9238795325, 0)), keep=Keep.TOP)


with BuildPart() as f18_tool108_1:
    add(f18_tool108.part)

    # F18_t116: intersect F18_tool112
    add(f18_tool112.part, mode=Mode.INTERSECT)


with BuildPart() as f1_12:
    add(f1_11.part)

    # F18_t106: cut F18_tool108
    add(f18_tool108_1.part, mode=Mode.SUBTRACT)

    # F14 (on face) → F19 (cut)
    with BuildSketch(Plane(origin=(0, 0, 0), x_dir=(0.3826834324, 0.9238795325, 0), z_dir=(0.9238795325, -0.3826834324, 0))):
        Polygon((-3, 16.7), (3, 16.7), (5, 16.7), (5, 31.7), (-5, 31.7), (-5, 16.7), align=None)
    extrude(amount=F19_DEPTH, mode=Mode.SUBTRACT)


solid = f1_12.part
